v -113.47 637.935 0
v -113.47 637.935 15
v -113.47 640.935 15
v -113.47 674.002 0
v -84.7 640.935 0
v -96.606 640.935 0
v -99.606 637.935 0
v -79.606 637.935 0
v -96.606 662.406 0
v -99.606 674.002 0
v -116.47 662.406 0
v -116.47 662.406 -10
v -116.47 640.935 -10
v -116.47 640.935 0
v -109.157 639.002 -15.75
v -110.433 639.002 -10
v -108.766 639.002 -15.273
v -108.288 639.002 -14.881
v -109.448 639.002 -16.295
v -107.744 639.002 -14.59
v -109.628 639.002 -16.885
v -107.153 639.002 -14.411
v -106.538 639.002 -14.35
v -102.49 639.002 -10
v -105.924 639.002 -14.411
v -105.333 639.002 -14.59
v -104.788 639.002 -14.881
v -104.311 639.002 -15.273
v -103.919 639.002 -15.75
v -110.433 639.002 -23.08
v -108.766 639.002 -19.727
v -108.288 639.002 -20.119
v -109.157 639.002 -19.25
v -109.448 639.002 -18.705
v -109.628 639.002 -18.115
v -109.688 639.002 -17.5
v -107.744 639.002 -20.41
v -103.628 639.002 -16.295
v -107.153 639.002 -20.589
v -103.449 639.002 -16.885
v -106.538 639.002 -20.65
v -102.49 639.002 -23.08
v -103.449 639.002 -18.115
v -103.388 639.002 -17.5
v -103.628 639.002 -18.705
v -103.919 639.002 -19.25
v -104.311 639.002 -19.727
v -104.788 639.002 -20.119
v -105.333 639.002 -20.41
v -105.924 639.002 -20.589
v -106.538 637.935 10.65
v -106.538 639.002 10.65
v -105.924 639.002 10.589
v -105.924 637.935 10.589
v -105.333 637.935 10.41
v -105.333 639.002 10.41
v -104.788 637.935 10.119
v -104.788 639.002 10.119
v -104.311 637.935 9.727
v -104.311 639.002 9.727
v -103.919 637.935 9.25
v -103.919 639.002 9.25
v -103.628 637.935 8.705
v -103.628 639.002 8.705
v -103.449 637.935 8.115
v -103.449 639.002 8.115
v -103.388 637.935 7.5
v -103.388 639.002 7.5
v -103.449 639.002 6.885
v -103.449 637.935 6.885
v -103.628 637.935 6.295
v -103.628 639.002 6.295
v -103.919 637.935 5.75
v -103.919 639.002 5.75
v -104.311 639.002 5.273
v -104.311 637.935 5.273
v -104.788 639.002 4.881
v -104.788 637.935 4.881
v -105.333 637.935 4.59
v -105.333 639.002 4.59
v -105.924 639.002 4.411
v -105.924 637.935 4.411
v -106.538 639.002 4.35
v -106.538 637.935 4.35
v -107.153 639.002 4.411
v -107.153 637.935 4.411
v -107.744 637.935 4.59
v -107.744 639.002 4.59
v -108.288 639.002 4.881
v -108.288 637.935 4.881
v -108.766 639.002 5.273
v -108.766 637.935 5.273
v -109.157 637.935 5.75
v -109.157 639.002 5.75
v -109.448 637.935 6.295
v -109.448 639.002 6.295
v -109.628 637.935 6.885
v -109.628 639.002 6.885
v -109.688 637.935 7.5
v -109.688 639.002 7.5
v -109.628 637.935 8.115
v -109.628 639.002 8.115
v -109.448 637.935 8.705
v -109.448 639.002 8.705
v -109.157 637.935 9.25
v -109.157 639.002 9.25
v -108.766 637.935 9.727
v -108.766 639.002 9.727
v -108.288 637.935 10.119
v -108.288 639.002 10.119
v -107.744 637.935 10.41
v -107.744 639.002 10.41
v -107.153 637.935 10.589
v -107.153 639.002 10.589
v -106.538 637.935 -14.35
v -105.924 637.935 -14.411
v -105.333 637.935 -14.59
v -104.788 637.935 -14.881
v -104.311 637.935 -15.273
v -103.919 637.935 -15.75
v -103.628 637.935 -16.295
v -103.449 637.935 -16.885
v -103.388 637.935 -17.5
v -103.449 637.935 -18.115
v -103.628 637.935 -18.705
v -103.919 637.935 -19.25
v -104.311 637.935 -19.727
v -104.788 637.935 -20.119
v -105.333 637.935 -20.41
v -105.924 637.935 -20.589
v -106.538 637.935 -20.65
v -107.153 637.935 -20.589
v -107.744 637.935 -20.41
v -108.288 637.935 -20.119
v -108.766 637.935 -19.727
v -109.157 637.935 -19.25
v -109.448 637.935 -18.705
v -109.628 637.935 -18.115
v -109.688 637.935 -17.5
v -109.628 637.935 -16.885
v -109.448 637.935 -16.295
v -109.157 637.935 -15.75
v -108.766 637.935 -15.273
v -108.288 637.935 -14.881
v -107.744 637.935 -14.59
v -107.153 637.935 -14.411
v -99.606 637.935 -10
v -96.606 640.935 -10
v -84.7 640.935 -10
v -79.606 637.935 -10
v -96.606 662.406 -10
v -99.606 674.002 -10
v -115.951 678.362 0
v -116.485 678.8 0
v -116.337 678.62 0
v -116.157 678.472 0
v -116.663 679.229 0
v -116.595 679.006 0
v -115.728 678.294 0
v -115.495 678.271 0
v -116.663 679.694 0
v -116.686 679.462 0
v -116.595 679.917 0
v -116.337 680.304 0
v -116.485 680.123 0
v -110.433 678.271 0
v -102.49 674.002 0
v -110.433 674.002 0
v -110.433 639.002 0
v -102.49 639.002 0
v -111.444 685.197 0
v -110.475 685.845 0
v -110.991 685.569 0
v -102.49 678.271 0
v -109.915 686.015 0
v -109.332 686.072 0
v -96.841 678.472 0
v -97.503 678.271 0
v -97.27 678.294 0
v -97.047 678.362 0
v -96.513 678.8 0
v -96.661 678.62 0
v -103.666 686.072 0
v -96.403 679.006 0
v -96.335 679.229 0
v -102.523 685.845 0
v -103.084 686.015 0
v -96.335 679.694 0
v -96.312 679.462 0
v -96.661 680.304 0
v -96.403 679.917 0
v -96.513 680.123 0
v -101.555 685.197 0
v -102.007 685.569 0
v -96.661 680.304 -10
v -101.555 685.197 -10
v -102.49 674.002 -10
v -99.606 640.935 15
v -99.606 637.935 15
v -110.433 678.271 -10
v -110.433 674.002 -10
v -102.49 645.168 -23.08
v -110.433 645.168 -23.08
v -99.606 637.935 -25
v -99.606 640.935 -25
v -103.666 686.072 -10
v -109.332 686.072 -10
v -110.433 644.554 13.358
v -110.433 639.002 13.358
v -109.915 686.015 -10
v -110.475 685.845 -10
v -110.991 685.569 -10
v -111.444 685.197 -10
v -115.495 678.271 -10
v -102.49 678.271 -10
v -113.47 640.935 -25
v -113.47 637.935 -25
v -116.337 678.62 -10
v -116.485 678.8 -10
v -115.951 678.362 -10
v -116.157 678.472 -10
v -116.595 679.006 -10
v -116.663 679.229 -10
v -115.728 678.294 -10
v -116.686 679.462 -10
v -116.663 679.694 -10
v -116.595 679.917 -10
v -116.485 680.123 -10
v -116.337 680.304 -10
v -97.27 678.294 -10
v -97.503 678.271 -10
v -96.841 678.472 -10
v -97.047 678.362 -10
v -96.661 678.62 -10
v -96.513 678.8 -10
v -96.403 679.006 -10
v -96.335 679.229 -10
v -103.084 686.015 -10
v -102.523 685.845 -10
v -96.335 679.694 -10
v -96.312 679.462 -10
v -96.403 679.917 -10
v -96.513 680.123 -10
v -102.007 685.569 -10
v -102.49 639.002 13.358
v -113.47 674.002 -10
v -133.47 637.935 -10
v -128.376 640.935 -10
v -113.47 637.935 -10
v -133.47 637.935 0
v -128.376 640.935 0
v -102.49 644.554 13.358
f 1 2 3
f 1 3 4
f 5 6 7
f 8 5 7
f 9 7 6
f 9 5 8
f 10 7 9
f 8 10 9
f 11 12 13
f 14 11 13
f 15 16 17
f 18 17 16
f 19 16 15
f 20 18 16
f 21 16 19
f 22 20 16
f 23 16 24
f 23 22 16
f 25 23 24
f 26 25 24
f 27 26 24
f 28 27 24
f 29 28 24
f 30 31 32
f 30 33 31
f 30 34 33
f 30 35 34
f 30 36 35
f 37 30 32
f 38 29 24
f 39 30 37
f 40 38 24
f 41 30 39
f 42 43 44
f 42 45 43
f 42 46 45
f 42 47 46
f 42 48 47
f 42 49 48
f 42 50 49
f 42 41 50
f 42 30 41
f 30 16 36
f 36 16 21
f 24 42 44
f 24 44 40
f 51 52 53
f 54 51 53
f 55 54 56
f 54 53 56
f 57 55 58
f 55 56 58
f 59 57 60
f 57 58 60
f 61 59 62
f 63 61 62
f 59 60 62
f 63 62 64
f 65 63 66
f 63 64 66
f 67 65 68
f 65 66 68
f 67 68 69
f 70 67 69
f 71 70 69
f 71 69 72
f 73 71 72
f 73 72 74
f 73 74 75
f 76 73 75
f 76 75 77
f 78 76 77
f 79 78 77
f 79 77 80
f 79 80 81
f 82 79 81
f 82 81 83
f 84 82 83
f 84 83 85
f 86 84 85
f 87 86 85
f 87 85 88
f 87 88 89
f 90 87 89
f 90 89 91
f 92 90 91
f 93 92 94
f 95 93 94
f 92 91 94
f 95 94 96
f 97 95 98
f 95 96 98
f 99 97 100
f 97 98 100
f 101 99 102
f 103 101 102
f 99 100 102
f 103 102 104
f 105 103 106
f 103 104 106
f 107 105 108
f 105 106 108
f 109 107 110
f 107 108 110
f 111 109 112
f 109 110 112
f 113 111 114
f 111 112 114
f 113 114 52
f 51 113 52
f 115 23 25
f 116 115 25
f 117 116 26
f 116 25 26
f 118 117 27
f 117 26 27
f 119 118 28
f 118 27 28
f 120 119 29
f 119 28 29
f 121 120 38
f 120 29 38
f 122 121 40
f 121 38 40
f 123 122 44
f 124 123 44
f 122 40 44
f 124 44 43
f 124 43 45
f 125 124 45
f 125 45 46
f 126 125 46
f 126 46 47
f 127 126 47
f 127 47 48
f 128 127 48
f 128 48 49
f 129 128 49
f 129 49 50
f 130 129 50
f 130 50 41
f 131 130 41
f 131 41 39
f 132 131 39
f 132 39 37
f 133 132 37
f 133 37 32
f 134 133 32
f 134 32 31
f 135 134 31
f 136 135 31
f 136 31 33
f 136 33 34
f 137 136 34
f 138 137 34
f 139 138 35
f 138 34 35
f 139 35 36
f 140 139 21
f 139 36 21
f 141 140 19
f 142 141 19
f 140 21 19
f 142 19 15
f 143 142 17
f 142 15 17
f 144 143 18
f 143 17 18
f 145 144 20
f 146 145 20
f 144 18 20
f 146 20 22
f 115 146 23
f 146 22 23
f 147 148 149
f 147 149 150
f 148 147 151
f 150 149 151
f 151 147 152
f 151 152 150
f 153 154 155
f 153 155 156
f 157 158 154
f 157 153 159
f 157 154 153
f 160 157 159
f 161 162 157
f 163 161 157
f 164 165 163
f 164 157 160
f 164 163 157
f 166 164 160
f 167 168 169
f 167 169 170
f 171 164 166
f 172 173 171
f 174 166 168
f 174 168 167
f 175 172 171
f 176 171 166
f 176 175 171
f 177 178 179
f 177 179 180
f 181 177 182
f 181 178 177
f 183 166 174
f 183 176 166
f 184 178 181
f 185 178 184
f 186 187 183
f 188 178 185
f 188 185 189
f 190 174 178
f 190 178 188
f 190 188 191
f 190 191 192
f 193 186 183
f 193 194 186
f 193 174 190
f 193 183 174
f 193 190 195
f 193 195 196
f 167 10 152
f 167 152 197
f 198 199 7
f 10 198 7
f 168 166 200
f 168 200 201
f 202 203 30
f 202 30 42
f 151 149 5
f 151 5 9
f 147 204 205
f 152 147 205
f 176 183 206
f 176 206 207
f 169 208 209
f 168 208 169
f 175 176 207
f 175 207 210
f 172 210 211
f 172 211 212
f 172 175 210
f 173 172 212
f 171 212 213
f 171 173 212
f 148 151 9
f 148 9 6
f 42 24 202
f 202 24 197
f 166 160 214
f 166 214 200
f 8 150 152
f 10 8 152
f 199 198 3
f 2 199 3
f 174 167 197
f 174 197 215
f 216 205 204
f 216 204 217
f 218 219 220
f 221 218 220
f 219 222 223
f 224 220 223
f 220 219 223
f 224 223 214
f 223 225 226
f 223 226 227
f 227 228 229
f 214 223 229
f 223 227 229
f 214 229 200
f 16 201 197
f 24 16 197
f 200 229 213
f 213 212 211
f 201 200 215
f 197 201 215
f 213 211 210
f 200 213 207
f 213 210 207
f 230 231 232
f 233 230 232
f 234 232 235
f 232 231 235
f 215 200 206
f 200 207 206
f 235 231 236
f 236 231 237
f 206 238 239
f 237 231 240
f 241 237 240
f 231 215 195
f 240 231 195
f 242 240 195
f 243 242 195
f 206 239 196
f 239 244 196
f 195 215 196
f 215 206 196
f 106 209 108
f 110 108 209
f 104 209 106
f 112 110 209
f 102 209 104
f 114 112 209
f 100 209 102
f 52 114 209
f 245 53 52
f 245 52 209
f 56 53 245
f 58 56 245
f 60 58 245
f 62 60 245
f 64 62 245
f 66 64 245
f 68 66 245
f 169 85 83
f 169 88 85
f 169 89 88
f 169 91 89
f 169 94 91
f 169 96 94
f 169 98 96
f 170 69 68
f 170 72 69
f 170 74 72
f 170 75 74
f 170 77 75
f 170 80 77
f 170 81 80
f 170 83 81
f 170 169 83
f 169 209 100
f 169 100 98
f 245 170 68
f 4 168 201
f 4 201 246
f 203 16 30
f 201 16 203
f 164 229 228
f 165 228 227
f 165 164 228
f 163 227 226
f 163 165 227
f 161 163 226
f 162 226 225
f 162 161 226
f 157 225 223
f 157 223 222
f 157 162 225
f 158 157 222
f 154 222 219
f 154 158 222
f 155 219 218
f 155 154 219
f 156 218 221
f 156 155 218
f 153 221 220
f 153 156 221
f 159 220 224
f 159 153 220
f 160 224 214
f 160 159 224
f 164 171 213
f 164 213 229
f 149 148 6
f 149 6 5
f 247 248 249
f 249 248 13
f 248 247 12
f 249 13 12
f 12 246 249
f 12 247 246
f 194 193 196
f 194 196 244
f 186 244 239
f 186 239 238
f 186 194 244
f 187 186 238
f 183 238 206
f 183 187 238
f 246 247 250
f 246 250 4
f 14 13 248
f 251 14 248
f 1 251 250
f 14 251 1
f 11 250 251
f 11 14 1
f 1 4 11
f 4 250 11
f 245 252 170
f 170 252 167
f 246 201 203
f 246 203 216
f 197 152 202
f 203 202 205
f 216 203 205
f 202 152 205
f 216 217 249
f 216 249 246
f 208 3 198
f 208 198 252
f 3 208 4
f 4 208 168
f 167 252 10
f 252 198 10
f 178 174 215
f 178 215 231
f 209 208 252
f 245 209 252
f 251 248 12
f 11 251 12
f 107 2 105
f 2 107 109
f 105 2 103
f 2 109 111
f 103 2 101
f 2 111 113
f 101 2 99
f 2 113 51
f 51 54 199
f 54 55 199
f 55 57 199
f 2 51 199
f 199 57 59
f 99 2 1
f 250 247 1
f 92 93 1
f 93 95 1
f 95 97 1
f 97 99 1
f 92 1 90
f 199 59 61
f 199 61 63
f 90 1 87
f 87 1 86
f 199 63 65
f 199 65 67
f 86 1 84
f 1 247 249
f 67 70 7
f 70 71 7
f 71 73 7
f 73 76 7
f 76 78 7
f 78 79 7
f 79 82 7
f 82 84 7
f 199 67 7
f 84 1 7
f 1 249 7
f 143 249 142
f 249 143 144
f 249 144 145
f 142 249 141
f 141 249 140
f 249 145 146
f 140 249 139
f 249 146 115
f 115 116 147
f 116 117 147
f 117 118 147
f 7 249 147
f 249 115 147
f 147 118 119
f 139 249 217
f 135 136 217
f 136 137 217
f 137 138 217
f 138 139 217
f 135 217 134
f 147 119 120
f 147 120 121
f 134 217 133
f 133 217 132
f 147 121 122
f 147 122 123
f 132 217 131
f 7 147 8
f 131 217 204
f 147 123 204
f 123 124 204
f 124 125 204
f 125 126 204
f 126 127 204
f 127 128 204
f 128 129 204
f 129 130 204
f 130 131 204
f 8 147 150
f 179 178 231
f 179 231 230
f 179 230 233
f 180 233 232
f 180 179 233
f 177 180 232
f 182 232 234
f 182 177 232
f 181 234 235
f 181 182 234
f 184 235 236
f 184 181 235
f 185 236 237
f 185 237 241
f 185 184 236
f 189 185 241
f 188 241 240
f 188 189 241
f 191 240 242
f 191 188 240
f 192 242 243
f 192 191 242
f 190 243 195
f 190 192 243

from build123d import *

# Parameters (mm, degrees)
BOSS_EXTRUDE1_DEPTH      = 10
BOSS_EXTRUDE2_DEPTH      = 15
BOSS_EXTRUDE2_DEPTH_BACK = 25
SKETCH2_W                = 13.86324318
SKETCH2_H                = 2.640648634
SKETCH3_R                = 3.15
CUT_EXTRUDE1_DEPTH       = 2.65
BOSS_EXTRUDE3_DEPTH      = 10
SKETCH5_R                = 3.15
CUT_EXTRUDE2_DEPTH       = 10
BOSS_EXTRUDE4_DEPTH      = 15
BOSS_EXTRUDE4_DEPTH_BACK = 25
SKETCH7_W                = 13.86324318
SKETCH7_H                = 33.4262151
CUT_EXTRUDE3_DEPTH       = 15
SKETCH13_W               = 7.942289342
SKETCH13_H               = 13.358433402
SKETCH13_H_2             = 13.079806518
CUT_EXTRUDE4_DEPTH       = 35


with BuildPart() as part:
    # Sketch1 → Boss-Extrude1 (new body)
    with BuildSketch(Plane.XY):
        with BuildLine():
            Line((-102.490463188, 678.270987862), (-97.502783366, 678.270987862))
            ThreePointArc((-97.502783366, 678.270987862), (-96.402724844, 679.006023468), (-96.660835024, 680.30363097))
            Line((-96.660835024, 680.30363097), (-101.554583476, 685.197379422))
            ThreePointArc((-101.554583476, 685.197379422), (-102.523344038, 685.844684534), (-103.666075035, 686.071987862))
            Line((-103.666075035, 686.071987862), (-109.332102168, 686.071987862))
            ThreePointArc((-109.332102168, 686.071987862), (-110.474833165, 685.844684534), (-111.443593727, 685.197379422))
            Line((-111.443593727, 685.197379422), (-116.337342179, 680.30363097))
            ThreePointArc((-116.337342179, 680.30363097), (-116.595452359, 679.006023468), (-115.495393837, 678.270987862))
            Line((-115.495393837, 678.270987862), (-112.290288601, 678.270987862))
            Line((-112.290288601, 678.270987862), (-110.43275253, 678.270987862))
            Line((-110.43275253, 678.270987862), (-110.43275253, 674.001864678))
            Line((-110.43275253, 674.001864678), (-113.469742626, 674.001864678))
            Line((-113.469742626, 674.001864678), (-113.469742626, 640.576503739))
            Line((-113.469742626, 640.576503739), (-113.469742626, 637.935000944))
            Line((-113.469742626, 637.935000944), (-99.606499446, 637.935000944))
            Line((-99.606499446, 637.935000944), (-99.606499446, 674.001864678))
            Line((-99.606499446, 674.001864678), (-102.490463188, 674.001864678))
            Line((-102.490463188, 674.001864678), (-102.490463188, 678.270987862))
        make_face()
    extrude(amount=-BOSS_EXTRUDE1_DEPTH)

    # Sketch2 → Boss-Extrude2 (add, two sides: drawn at the far end of the back side and taken through both)
    with BuildSketch(Plane.XY.offset(-BOSS_EXTRUDE2_DEPTH_BACK)):
        with Locations((-106.538121036, 639.255325261)):
            Rectangle(SKETCH2_W, SKETCH2_H)
    extrude(amount=BOSS_EXTRUDE2_DEPTH + BOSS_EXTRUDE2_DEPTH_BACK)

    # Sketch3 → Cut-Extrude1 (cut)
    with BuildSketch(Plane(origin=(0, 640.575649578, 0), x_dir=(1, 0, 0), z_dir=(0, 1, 0))):
        with Locations(Location((-106.538121036, -7.5, 0), (0, 0, 270))):
            Circle(SKETCH3_R)
    extrude(amount=-CUT_EXTRUDE1_DEPTH, mode=Mode.SUBTRACT)

    # Sketch4 → Boss-Extrude3 (add)
    # profile 1 of 2: a face of its own
    with BuildSketch(Plane(origin=(0, 0, -10), x_dir=(-1, 0, 0), z_dir=(0, 0, -1))):
        Polygon((99.606499446, 637.935000944), (79.606499446, 637.935000944), (99.606499446, 674.001864678), align=None)
        Polygon((84.700453543, 640.935000944), (96.606499446, 662.405687703), (96.606499446, 640.935000944), align=None, mode=Mode.SUBTRACT)
    # profile 2 of 2: a face of its own
    with BuildSketch(Plane(origin=(0, 0, -10), x_dir=(-1, 0, 0), z_dir=(0, 0, -1))):
        Polygon((113.469742626, 637.935000944), (133.469742626, 637.935000944), (113.469742626, 674.001864678), align=None)
        Polygon((116.469742626, 662.405687703), (116.469742626, 640.935000944), (128.375788529, 640.935000944), align=None, mode=Mode.SUBTRACT)
    extrude(amount=-BOSS_EXTRUDE3_DEPTH)

    # Sketch5 → Cut-Extrude2 (cut)
    with BuildSketch(Plane(origin=(0, 640.575649578, 0), x_dir=(1, 0, 0), z_dir=(0, 1, 0))):
        with Locations(Location((-106.538121036, 17.5, 0), (0, 0, 270))):
            Circle(SKETCH5_R)
    extrude(amount=-CUT_EXTRUDE2_DEPTH, mode=Mode.SUBTRACT)

    # Sketch7 → Boss-Extrude4 (add, two sides: drawn at the far end of the back side and taken through both)
    with BuildSketch(Plane(origin=(0, 0, -10), x_dir=(-1, 0, 0), z_dir=(0, 0, -1)).offset(-BOSS_EXTRUDE4_DEPTH_BACK)):
        with Locations((106.538121036, 657.288757128)):
            Rectangle(SKETCH7_W, SKETCH7_H)
    extrude(amount=BOSS_EXTRUDE4_DEPTH + BOSS_EXTRUDE4_DEPTH_BACK)

    # Sketch10 → Cut-Extrude3 (cut)
    with BuildSketch(Plane(origin=(-99.606499446, 0, 0), x_dir=(0, 0, -1), z_dir=(1, 0, 0))):
        Polygon((25, 674.001864678), (10, 674.001864678), (25, 640.935000944), align=None)
        Polygon((-15, 640.935000944), (0, 674.001864678), (-15, 674.001864678), align=None)
    extrude(amount=-CUT_EXTRUDE3_DEPTH, mode=Mode.SUBTRACT)

    # Sketch13 → Cut-Extrude4 (cut)
    with BuildSketch(Plane(origin=(0, 674.001864678, 0), x_dir=(1, 0, 0), z_dir=(0, 1, 0))):
        with Locations((-106.461607859, -6.679216701)):
            Rectangle(SKETCH13_W, SKETCH13_H)
        with Locations((-106.461607859, 16.539903259)):
            Rectangle(SKETCH13_W, SKETCH13_H_2)
    extrude(amount=-CUT_EXTRUDE4_DEPTH, mode=Mode.SUBTRACT)


solid = part.part
